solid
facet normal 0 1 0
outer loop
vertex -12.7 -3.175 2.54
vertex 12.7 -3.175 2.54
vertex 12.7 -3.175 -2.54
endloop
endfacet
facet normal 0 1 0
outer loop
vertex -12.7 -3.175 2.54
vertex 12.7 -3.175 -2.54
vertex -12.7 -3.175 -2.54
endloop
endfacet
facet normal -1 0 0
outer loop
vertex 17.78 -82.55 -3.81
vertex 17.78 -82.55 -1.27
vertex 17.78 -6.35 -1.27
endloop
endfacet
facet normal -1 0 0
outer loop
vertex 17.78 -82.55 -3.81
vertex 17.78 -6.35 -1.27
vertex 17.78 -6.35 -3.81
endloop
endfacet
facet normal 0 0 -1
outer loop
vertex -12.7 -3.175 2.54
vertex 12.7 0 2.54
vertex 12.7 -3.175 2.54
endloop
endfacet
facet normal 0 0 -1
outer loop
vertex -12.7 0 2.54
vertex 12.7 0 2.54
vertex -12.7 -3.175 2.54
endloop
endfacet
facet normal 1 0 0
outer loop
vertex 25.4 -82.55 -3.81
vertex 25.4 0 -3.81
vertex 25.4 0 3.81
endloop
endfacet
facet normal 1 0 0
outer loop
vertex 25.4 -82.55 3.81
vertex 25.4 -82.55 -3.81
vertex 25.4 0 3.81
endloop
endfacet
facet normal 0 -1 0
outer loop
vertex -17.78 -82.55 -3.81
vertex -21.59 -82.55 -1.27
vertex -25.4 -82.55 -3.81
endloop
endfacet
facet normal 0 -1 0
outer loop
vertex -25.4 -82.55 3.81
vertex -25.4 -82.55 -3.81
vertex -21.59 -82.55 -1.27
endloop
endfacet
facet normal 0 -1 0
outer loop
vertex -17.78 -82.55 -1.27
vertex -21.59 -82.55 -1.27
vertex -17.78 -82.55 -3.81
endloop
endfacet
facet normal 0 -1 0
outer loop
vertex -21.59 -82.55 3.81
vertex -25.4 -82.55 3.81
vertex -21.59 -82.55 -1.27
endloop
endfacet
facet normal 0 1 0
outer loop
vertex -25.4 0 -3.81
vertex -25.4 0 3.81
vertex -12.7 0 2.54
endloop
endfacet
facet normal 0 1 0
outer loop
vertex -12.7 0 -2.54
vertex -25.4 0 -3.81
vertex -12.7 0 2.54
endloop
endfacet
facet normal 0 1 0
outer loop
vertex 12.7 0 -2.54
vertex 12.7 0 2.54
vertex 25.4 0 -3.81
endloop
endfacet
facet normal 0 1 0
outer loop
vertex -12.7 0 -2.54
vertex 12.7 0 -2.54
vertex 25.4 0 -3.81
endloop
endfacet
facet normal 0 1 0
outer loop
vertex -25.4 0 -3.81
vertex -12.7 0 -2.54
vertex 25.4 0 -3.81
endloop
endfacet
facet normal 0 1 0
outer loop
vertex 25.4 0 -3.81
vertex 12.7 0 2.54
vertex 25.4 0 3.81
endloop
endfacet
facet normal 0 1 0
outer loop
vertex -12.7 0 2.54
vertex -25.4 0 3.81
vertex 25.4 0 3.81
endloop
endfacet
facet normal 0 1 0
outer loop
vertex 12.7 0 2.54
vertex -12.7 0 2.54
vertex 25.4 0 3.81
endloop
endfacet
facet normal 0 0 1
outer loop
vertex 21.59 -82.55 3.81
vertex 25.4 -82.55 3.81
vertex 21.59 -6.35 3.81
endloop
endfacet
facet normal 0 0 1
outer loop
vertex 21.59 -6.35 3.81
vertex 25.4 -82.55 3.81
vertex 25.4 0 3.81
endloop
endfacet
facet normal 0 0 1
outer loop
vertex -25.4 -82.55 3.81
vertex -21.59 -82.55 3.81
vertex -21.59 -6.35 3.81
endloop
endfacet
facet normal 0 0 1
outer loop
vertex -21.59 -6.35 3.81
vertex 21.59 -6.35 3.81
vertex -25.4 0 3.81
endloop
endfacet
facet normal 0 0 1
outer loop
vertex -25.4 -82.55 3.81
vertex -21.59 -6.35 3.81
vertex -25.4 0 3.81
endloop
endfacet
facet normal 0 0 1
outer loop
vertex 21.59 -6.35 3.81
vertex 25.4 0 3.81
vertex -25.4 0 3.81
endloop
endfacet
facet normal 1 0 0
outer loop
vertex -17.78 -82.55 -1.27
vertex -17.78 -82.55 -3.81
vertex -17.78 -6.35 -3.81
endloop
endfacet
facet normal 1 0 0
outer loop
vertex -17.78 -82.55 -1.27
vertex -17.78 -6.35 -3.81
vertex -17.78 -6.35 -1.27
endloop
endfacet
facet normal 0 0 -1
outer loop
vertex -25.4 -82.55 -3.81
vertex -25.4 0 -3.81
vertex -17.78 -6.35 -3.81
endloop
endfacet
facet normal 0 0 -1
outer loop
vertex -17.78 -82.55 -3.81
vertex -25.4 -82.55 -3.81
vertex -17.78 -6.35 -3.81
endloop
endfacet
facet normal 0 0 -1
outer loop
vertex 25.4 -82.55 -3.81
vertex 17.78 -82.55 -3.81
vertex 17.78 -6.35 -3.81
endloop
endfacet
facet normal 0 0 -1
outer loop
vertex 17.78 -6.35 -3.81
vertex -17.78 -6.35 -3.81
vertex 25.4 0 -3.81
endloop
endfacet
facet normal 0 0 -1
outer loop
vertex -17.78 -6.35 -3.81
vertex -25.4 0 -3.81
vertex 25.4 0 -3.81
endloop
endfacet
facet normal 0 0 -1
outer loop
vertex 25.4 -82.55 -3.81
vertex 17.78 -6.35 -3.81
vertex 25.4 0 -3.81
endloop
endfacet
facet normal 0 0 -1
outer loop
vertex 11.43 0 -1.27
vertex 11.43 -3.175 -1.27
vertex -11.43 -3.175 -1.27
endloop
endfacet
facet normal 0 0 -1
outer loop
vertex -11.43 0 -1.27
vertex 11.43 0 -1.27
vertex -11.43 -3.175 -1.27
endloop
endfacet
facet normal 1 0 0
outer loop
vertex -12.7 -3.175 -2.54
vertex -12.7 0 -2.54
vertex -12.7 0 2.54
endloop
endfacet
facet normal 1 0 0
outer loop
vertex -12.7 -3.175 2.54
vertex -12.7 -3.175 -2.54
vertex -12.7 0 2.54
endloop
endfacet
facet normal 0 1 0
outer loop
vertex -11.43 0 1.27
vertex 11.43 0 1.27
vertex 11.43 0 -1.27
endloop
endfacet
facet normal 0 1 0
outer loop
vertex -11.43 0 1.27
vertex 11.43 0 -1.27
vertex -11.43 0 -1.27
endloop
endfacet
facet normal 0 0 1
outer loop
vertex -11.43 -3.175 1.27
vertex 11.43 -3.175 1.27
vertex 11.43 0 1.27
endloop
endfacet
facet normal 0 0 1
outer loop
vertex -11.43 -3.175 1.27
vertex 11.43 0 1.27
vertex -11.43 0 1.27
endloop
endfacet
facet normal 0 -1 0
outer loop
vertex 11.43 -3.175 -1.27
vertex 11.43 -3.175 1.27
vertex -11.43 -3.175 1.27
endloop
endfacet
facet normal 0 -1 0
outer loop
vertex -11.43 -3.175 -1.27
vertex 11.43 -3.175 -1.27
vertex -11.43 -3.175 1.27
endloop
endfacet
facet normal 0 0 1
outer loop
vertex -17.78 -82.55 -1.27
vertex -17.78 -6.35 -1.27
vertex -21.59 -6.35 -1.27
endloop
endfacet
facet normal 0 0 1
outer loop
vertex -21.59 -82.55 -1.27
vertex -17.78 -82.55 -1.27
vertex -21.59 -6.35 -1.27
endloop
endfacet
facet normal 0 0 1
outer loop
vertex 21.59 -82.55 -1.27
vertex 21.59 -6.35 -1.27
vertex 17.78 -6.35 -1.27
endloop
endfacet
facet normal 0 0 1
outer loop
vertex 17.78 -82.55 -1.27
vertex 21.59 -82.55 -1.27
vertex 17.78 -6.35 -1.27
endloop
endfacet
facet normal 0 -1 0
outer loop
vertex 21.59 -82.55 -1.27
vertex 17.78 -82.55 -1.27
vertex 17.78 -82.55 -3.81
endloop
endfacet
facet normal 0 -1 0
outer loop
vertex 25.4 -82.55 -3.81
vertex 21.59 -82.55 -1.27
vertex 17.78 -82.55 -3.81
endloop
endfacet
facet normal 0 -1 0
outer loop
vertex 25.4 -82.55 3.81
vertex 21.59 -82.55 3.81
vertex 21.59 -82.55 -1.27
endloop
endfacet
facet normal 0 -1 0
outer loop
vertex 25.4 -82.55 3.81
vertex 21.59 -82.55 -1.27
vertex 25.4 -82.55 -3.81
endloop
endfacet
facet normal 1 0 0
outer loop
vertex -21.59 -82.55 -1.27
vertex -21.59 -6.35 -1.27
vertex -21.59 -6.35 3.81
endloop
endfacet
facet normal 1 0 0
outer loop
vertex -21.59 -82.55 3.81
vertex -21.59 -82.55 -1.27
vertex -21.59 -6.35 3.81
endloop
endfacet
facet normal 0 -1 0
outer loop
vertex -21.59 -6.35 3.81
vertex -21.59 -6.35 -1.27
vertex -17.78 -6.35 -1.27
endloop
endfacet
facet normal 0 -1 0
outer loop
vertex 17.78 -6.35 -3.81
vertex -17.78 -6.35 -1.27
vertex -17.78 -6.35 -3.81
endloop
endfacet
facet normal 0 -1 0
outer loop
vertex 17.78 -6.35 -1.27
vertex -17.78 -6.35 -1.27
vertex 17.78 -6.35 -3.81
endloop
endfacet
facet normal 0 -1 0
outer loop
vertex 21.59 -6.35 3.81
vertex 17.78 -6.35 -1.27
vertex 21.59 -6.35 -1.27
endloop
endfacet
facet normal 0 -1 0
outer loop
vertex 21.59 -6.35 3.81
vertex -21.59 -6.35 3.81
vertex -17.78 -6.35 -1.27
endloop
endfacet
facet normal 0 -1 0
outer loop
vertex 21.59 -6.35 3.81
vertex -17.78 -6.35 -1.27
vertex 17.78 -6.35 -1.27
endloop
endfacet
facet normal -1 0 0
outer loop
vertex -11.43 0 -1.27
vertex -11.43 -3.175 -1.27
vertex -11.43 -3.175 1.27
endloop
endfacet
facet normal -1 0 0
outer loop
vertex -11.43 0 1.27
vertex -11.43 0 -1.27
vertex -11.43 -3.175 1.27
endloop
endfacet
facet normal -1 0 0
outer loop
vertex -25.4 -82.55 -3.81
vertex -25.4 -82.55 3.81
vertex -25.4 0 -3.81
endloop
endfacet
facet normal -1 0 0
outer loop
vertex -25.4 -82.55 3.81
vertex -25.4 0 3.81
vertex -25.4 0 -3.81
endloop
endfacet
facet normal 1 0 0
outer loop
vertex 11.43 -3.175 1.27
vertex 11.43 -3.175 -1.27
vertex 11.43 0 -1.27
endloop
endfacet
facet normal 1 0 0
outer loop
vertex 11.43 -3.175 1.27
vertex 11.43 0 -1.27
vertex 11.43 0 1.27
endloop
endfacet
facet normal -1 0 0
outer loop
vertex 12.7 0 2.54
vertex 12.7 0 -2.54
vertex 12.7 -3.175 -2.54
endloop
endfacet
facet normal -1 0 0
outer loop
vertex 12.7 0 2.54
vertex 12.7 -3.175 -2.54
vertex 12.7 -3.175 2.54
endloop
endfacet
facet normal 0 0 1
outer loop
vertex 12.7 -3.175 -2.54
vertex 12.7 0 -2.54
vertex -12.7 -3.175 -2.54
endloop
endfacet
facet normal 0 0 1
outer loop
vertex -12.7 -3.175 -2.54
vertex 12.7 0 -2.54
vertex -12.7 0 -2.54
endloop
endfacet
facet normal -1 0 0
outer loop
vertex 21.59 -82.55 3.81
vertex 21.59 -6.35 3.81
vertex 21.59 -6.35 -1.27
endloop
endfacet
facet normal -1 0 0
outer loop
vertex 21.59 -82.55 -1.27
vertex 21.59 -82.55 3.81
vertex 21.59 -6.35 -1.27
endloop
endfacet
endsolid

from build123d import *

# Parameters (mm, degrees)
F0_W     = 50.8
F0_H     = 7.62
F1_DEPTH = 6.35
F3_DEPTH = 76.2
F4_W     = 25.4
F4_H     = 5.08
F5_DEPTH = 3.175
F6_W     = 22.86
F6_H     = 2.54
F7_DEPTH = 3.175


with BuildPart() as f1:
    # F0 (on Front) → F1 (new body)
    with BuildSketch(Plane.XZ):
        Rectangle(F0_W, F0_H)
    extrude(amount=F1_DEPTH)

    # F2 (on face) → F3 (join)
    with BuildSketch(Plane.XZ.offset(6.35)):
        Polygon((-21.59, -1.27), (-21.59, 3.81), (-25.4, 3.81), (-25.4, -3.81), (-17.78, -3.81), (-17.78, -1.27), align=None)
        Polygon((25.4, 3.81), (21.59, 3.81), (21.59, -1.27), (17.78, -1.27), (17.78, -3.81), (25.4, -3.81), align=None)
    extrude(amount=F3_DEPTH)

    # F4 (on face) → F5 (cut)
    with BuildSketch(Plane(origin=(0, 0, 0), x_dir=(-1, 0, 0), z_dir=(0, 1, 0))):
        Rectangle(F4_W, F4_H)
    extrude(amount=-F5_DEPTH, mode=Mode.SUBTRACT)


with BuildPart() as f7:
    # F6 (on face) → F7 (new body)
    with BuildSketch(Plane(origin=(0, -3.175, 0), x_dir=(-1, 0, 0), z_dir=(0, 1, 0))):
        Rectangle(F6_W, F6_H)
    extrude(amount=F7_DEPTH)


solid = Compound([f1.part, f7.part])
